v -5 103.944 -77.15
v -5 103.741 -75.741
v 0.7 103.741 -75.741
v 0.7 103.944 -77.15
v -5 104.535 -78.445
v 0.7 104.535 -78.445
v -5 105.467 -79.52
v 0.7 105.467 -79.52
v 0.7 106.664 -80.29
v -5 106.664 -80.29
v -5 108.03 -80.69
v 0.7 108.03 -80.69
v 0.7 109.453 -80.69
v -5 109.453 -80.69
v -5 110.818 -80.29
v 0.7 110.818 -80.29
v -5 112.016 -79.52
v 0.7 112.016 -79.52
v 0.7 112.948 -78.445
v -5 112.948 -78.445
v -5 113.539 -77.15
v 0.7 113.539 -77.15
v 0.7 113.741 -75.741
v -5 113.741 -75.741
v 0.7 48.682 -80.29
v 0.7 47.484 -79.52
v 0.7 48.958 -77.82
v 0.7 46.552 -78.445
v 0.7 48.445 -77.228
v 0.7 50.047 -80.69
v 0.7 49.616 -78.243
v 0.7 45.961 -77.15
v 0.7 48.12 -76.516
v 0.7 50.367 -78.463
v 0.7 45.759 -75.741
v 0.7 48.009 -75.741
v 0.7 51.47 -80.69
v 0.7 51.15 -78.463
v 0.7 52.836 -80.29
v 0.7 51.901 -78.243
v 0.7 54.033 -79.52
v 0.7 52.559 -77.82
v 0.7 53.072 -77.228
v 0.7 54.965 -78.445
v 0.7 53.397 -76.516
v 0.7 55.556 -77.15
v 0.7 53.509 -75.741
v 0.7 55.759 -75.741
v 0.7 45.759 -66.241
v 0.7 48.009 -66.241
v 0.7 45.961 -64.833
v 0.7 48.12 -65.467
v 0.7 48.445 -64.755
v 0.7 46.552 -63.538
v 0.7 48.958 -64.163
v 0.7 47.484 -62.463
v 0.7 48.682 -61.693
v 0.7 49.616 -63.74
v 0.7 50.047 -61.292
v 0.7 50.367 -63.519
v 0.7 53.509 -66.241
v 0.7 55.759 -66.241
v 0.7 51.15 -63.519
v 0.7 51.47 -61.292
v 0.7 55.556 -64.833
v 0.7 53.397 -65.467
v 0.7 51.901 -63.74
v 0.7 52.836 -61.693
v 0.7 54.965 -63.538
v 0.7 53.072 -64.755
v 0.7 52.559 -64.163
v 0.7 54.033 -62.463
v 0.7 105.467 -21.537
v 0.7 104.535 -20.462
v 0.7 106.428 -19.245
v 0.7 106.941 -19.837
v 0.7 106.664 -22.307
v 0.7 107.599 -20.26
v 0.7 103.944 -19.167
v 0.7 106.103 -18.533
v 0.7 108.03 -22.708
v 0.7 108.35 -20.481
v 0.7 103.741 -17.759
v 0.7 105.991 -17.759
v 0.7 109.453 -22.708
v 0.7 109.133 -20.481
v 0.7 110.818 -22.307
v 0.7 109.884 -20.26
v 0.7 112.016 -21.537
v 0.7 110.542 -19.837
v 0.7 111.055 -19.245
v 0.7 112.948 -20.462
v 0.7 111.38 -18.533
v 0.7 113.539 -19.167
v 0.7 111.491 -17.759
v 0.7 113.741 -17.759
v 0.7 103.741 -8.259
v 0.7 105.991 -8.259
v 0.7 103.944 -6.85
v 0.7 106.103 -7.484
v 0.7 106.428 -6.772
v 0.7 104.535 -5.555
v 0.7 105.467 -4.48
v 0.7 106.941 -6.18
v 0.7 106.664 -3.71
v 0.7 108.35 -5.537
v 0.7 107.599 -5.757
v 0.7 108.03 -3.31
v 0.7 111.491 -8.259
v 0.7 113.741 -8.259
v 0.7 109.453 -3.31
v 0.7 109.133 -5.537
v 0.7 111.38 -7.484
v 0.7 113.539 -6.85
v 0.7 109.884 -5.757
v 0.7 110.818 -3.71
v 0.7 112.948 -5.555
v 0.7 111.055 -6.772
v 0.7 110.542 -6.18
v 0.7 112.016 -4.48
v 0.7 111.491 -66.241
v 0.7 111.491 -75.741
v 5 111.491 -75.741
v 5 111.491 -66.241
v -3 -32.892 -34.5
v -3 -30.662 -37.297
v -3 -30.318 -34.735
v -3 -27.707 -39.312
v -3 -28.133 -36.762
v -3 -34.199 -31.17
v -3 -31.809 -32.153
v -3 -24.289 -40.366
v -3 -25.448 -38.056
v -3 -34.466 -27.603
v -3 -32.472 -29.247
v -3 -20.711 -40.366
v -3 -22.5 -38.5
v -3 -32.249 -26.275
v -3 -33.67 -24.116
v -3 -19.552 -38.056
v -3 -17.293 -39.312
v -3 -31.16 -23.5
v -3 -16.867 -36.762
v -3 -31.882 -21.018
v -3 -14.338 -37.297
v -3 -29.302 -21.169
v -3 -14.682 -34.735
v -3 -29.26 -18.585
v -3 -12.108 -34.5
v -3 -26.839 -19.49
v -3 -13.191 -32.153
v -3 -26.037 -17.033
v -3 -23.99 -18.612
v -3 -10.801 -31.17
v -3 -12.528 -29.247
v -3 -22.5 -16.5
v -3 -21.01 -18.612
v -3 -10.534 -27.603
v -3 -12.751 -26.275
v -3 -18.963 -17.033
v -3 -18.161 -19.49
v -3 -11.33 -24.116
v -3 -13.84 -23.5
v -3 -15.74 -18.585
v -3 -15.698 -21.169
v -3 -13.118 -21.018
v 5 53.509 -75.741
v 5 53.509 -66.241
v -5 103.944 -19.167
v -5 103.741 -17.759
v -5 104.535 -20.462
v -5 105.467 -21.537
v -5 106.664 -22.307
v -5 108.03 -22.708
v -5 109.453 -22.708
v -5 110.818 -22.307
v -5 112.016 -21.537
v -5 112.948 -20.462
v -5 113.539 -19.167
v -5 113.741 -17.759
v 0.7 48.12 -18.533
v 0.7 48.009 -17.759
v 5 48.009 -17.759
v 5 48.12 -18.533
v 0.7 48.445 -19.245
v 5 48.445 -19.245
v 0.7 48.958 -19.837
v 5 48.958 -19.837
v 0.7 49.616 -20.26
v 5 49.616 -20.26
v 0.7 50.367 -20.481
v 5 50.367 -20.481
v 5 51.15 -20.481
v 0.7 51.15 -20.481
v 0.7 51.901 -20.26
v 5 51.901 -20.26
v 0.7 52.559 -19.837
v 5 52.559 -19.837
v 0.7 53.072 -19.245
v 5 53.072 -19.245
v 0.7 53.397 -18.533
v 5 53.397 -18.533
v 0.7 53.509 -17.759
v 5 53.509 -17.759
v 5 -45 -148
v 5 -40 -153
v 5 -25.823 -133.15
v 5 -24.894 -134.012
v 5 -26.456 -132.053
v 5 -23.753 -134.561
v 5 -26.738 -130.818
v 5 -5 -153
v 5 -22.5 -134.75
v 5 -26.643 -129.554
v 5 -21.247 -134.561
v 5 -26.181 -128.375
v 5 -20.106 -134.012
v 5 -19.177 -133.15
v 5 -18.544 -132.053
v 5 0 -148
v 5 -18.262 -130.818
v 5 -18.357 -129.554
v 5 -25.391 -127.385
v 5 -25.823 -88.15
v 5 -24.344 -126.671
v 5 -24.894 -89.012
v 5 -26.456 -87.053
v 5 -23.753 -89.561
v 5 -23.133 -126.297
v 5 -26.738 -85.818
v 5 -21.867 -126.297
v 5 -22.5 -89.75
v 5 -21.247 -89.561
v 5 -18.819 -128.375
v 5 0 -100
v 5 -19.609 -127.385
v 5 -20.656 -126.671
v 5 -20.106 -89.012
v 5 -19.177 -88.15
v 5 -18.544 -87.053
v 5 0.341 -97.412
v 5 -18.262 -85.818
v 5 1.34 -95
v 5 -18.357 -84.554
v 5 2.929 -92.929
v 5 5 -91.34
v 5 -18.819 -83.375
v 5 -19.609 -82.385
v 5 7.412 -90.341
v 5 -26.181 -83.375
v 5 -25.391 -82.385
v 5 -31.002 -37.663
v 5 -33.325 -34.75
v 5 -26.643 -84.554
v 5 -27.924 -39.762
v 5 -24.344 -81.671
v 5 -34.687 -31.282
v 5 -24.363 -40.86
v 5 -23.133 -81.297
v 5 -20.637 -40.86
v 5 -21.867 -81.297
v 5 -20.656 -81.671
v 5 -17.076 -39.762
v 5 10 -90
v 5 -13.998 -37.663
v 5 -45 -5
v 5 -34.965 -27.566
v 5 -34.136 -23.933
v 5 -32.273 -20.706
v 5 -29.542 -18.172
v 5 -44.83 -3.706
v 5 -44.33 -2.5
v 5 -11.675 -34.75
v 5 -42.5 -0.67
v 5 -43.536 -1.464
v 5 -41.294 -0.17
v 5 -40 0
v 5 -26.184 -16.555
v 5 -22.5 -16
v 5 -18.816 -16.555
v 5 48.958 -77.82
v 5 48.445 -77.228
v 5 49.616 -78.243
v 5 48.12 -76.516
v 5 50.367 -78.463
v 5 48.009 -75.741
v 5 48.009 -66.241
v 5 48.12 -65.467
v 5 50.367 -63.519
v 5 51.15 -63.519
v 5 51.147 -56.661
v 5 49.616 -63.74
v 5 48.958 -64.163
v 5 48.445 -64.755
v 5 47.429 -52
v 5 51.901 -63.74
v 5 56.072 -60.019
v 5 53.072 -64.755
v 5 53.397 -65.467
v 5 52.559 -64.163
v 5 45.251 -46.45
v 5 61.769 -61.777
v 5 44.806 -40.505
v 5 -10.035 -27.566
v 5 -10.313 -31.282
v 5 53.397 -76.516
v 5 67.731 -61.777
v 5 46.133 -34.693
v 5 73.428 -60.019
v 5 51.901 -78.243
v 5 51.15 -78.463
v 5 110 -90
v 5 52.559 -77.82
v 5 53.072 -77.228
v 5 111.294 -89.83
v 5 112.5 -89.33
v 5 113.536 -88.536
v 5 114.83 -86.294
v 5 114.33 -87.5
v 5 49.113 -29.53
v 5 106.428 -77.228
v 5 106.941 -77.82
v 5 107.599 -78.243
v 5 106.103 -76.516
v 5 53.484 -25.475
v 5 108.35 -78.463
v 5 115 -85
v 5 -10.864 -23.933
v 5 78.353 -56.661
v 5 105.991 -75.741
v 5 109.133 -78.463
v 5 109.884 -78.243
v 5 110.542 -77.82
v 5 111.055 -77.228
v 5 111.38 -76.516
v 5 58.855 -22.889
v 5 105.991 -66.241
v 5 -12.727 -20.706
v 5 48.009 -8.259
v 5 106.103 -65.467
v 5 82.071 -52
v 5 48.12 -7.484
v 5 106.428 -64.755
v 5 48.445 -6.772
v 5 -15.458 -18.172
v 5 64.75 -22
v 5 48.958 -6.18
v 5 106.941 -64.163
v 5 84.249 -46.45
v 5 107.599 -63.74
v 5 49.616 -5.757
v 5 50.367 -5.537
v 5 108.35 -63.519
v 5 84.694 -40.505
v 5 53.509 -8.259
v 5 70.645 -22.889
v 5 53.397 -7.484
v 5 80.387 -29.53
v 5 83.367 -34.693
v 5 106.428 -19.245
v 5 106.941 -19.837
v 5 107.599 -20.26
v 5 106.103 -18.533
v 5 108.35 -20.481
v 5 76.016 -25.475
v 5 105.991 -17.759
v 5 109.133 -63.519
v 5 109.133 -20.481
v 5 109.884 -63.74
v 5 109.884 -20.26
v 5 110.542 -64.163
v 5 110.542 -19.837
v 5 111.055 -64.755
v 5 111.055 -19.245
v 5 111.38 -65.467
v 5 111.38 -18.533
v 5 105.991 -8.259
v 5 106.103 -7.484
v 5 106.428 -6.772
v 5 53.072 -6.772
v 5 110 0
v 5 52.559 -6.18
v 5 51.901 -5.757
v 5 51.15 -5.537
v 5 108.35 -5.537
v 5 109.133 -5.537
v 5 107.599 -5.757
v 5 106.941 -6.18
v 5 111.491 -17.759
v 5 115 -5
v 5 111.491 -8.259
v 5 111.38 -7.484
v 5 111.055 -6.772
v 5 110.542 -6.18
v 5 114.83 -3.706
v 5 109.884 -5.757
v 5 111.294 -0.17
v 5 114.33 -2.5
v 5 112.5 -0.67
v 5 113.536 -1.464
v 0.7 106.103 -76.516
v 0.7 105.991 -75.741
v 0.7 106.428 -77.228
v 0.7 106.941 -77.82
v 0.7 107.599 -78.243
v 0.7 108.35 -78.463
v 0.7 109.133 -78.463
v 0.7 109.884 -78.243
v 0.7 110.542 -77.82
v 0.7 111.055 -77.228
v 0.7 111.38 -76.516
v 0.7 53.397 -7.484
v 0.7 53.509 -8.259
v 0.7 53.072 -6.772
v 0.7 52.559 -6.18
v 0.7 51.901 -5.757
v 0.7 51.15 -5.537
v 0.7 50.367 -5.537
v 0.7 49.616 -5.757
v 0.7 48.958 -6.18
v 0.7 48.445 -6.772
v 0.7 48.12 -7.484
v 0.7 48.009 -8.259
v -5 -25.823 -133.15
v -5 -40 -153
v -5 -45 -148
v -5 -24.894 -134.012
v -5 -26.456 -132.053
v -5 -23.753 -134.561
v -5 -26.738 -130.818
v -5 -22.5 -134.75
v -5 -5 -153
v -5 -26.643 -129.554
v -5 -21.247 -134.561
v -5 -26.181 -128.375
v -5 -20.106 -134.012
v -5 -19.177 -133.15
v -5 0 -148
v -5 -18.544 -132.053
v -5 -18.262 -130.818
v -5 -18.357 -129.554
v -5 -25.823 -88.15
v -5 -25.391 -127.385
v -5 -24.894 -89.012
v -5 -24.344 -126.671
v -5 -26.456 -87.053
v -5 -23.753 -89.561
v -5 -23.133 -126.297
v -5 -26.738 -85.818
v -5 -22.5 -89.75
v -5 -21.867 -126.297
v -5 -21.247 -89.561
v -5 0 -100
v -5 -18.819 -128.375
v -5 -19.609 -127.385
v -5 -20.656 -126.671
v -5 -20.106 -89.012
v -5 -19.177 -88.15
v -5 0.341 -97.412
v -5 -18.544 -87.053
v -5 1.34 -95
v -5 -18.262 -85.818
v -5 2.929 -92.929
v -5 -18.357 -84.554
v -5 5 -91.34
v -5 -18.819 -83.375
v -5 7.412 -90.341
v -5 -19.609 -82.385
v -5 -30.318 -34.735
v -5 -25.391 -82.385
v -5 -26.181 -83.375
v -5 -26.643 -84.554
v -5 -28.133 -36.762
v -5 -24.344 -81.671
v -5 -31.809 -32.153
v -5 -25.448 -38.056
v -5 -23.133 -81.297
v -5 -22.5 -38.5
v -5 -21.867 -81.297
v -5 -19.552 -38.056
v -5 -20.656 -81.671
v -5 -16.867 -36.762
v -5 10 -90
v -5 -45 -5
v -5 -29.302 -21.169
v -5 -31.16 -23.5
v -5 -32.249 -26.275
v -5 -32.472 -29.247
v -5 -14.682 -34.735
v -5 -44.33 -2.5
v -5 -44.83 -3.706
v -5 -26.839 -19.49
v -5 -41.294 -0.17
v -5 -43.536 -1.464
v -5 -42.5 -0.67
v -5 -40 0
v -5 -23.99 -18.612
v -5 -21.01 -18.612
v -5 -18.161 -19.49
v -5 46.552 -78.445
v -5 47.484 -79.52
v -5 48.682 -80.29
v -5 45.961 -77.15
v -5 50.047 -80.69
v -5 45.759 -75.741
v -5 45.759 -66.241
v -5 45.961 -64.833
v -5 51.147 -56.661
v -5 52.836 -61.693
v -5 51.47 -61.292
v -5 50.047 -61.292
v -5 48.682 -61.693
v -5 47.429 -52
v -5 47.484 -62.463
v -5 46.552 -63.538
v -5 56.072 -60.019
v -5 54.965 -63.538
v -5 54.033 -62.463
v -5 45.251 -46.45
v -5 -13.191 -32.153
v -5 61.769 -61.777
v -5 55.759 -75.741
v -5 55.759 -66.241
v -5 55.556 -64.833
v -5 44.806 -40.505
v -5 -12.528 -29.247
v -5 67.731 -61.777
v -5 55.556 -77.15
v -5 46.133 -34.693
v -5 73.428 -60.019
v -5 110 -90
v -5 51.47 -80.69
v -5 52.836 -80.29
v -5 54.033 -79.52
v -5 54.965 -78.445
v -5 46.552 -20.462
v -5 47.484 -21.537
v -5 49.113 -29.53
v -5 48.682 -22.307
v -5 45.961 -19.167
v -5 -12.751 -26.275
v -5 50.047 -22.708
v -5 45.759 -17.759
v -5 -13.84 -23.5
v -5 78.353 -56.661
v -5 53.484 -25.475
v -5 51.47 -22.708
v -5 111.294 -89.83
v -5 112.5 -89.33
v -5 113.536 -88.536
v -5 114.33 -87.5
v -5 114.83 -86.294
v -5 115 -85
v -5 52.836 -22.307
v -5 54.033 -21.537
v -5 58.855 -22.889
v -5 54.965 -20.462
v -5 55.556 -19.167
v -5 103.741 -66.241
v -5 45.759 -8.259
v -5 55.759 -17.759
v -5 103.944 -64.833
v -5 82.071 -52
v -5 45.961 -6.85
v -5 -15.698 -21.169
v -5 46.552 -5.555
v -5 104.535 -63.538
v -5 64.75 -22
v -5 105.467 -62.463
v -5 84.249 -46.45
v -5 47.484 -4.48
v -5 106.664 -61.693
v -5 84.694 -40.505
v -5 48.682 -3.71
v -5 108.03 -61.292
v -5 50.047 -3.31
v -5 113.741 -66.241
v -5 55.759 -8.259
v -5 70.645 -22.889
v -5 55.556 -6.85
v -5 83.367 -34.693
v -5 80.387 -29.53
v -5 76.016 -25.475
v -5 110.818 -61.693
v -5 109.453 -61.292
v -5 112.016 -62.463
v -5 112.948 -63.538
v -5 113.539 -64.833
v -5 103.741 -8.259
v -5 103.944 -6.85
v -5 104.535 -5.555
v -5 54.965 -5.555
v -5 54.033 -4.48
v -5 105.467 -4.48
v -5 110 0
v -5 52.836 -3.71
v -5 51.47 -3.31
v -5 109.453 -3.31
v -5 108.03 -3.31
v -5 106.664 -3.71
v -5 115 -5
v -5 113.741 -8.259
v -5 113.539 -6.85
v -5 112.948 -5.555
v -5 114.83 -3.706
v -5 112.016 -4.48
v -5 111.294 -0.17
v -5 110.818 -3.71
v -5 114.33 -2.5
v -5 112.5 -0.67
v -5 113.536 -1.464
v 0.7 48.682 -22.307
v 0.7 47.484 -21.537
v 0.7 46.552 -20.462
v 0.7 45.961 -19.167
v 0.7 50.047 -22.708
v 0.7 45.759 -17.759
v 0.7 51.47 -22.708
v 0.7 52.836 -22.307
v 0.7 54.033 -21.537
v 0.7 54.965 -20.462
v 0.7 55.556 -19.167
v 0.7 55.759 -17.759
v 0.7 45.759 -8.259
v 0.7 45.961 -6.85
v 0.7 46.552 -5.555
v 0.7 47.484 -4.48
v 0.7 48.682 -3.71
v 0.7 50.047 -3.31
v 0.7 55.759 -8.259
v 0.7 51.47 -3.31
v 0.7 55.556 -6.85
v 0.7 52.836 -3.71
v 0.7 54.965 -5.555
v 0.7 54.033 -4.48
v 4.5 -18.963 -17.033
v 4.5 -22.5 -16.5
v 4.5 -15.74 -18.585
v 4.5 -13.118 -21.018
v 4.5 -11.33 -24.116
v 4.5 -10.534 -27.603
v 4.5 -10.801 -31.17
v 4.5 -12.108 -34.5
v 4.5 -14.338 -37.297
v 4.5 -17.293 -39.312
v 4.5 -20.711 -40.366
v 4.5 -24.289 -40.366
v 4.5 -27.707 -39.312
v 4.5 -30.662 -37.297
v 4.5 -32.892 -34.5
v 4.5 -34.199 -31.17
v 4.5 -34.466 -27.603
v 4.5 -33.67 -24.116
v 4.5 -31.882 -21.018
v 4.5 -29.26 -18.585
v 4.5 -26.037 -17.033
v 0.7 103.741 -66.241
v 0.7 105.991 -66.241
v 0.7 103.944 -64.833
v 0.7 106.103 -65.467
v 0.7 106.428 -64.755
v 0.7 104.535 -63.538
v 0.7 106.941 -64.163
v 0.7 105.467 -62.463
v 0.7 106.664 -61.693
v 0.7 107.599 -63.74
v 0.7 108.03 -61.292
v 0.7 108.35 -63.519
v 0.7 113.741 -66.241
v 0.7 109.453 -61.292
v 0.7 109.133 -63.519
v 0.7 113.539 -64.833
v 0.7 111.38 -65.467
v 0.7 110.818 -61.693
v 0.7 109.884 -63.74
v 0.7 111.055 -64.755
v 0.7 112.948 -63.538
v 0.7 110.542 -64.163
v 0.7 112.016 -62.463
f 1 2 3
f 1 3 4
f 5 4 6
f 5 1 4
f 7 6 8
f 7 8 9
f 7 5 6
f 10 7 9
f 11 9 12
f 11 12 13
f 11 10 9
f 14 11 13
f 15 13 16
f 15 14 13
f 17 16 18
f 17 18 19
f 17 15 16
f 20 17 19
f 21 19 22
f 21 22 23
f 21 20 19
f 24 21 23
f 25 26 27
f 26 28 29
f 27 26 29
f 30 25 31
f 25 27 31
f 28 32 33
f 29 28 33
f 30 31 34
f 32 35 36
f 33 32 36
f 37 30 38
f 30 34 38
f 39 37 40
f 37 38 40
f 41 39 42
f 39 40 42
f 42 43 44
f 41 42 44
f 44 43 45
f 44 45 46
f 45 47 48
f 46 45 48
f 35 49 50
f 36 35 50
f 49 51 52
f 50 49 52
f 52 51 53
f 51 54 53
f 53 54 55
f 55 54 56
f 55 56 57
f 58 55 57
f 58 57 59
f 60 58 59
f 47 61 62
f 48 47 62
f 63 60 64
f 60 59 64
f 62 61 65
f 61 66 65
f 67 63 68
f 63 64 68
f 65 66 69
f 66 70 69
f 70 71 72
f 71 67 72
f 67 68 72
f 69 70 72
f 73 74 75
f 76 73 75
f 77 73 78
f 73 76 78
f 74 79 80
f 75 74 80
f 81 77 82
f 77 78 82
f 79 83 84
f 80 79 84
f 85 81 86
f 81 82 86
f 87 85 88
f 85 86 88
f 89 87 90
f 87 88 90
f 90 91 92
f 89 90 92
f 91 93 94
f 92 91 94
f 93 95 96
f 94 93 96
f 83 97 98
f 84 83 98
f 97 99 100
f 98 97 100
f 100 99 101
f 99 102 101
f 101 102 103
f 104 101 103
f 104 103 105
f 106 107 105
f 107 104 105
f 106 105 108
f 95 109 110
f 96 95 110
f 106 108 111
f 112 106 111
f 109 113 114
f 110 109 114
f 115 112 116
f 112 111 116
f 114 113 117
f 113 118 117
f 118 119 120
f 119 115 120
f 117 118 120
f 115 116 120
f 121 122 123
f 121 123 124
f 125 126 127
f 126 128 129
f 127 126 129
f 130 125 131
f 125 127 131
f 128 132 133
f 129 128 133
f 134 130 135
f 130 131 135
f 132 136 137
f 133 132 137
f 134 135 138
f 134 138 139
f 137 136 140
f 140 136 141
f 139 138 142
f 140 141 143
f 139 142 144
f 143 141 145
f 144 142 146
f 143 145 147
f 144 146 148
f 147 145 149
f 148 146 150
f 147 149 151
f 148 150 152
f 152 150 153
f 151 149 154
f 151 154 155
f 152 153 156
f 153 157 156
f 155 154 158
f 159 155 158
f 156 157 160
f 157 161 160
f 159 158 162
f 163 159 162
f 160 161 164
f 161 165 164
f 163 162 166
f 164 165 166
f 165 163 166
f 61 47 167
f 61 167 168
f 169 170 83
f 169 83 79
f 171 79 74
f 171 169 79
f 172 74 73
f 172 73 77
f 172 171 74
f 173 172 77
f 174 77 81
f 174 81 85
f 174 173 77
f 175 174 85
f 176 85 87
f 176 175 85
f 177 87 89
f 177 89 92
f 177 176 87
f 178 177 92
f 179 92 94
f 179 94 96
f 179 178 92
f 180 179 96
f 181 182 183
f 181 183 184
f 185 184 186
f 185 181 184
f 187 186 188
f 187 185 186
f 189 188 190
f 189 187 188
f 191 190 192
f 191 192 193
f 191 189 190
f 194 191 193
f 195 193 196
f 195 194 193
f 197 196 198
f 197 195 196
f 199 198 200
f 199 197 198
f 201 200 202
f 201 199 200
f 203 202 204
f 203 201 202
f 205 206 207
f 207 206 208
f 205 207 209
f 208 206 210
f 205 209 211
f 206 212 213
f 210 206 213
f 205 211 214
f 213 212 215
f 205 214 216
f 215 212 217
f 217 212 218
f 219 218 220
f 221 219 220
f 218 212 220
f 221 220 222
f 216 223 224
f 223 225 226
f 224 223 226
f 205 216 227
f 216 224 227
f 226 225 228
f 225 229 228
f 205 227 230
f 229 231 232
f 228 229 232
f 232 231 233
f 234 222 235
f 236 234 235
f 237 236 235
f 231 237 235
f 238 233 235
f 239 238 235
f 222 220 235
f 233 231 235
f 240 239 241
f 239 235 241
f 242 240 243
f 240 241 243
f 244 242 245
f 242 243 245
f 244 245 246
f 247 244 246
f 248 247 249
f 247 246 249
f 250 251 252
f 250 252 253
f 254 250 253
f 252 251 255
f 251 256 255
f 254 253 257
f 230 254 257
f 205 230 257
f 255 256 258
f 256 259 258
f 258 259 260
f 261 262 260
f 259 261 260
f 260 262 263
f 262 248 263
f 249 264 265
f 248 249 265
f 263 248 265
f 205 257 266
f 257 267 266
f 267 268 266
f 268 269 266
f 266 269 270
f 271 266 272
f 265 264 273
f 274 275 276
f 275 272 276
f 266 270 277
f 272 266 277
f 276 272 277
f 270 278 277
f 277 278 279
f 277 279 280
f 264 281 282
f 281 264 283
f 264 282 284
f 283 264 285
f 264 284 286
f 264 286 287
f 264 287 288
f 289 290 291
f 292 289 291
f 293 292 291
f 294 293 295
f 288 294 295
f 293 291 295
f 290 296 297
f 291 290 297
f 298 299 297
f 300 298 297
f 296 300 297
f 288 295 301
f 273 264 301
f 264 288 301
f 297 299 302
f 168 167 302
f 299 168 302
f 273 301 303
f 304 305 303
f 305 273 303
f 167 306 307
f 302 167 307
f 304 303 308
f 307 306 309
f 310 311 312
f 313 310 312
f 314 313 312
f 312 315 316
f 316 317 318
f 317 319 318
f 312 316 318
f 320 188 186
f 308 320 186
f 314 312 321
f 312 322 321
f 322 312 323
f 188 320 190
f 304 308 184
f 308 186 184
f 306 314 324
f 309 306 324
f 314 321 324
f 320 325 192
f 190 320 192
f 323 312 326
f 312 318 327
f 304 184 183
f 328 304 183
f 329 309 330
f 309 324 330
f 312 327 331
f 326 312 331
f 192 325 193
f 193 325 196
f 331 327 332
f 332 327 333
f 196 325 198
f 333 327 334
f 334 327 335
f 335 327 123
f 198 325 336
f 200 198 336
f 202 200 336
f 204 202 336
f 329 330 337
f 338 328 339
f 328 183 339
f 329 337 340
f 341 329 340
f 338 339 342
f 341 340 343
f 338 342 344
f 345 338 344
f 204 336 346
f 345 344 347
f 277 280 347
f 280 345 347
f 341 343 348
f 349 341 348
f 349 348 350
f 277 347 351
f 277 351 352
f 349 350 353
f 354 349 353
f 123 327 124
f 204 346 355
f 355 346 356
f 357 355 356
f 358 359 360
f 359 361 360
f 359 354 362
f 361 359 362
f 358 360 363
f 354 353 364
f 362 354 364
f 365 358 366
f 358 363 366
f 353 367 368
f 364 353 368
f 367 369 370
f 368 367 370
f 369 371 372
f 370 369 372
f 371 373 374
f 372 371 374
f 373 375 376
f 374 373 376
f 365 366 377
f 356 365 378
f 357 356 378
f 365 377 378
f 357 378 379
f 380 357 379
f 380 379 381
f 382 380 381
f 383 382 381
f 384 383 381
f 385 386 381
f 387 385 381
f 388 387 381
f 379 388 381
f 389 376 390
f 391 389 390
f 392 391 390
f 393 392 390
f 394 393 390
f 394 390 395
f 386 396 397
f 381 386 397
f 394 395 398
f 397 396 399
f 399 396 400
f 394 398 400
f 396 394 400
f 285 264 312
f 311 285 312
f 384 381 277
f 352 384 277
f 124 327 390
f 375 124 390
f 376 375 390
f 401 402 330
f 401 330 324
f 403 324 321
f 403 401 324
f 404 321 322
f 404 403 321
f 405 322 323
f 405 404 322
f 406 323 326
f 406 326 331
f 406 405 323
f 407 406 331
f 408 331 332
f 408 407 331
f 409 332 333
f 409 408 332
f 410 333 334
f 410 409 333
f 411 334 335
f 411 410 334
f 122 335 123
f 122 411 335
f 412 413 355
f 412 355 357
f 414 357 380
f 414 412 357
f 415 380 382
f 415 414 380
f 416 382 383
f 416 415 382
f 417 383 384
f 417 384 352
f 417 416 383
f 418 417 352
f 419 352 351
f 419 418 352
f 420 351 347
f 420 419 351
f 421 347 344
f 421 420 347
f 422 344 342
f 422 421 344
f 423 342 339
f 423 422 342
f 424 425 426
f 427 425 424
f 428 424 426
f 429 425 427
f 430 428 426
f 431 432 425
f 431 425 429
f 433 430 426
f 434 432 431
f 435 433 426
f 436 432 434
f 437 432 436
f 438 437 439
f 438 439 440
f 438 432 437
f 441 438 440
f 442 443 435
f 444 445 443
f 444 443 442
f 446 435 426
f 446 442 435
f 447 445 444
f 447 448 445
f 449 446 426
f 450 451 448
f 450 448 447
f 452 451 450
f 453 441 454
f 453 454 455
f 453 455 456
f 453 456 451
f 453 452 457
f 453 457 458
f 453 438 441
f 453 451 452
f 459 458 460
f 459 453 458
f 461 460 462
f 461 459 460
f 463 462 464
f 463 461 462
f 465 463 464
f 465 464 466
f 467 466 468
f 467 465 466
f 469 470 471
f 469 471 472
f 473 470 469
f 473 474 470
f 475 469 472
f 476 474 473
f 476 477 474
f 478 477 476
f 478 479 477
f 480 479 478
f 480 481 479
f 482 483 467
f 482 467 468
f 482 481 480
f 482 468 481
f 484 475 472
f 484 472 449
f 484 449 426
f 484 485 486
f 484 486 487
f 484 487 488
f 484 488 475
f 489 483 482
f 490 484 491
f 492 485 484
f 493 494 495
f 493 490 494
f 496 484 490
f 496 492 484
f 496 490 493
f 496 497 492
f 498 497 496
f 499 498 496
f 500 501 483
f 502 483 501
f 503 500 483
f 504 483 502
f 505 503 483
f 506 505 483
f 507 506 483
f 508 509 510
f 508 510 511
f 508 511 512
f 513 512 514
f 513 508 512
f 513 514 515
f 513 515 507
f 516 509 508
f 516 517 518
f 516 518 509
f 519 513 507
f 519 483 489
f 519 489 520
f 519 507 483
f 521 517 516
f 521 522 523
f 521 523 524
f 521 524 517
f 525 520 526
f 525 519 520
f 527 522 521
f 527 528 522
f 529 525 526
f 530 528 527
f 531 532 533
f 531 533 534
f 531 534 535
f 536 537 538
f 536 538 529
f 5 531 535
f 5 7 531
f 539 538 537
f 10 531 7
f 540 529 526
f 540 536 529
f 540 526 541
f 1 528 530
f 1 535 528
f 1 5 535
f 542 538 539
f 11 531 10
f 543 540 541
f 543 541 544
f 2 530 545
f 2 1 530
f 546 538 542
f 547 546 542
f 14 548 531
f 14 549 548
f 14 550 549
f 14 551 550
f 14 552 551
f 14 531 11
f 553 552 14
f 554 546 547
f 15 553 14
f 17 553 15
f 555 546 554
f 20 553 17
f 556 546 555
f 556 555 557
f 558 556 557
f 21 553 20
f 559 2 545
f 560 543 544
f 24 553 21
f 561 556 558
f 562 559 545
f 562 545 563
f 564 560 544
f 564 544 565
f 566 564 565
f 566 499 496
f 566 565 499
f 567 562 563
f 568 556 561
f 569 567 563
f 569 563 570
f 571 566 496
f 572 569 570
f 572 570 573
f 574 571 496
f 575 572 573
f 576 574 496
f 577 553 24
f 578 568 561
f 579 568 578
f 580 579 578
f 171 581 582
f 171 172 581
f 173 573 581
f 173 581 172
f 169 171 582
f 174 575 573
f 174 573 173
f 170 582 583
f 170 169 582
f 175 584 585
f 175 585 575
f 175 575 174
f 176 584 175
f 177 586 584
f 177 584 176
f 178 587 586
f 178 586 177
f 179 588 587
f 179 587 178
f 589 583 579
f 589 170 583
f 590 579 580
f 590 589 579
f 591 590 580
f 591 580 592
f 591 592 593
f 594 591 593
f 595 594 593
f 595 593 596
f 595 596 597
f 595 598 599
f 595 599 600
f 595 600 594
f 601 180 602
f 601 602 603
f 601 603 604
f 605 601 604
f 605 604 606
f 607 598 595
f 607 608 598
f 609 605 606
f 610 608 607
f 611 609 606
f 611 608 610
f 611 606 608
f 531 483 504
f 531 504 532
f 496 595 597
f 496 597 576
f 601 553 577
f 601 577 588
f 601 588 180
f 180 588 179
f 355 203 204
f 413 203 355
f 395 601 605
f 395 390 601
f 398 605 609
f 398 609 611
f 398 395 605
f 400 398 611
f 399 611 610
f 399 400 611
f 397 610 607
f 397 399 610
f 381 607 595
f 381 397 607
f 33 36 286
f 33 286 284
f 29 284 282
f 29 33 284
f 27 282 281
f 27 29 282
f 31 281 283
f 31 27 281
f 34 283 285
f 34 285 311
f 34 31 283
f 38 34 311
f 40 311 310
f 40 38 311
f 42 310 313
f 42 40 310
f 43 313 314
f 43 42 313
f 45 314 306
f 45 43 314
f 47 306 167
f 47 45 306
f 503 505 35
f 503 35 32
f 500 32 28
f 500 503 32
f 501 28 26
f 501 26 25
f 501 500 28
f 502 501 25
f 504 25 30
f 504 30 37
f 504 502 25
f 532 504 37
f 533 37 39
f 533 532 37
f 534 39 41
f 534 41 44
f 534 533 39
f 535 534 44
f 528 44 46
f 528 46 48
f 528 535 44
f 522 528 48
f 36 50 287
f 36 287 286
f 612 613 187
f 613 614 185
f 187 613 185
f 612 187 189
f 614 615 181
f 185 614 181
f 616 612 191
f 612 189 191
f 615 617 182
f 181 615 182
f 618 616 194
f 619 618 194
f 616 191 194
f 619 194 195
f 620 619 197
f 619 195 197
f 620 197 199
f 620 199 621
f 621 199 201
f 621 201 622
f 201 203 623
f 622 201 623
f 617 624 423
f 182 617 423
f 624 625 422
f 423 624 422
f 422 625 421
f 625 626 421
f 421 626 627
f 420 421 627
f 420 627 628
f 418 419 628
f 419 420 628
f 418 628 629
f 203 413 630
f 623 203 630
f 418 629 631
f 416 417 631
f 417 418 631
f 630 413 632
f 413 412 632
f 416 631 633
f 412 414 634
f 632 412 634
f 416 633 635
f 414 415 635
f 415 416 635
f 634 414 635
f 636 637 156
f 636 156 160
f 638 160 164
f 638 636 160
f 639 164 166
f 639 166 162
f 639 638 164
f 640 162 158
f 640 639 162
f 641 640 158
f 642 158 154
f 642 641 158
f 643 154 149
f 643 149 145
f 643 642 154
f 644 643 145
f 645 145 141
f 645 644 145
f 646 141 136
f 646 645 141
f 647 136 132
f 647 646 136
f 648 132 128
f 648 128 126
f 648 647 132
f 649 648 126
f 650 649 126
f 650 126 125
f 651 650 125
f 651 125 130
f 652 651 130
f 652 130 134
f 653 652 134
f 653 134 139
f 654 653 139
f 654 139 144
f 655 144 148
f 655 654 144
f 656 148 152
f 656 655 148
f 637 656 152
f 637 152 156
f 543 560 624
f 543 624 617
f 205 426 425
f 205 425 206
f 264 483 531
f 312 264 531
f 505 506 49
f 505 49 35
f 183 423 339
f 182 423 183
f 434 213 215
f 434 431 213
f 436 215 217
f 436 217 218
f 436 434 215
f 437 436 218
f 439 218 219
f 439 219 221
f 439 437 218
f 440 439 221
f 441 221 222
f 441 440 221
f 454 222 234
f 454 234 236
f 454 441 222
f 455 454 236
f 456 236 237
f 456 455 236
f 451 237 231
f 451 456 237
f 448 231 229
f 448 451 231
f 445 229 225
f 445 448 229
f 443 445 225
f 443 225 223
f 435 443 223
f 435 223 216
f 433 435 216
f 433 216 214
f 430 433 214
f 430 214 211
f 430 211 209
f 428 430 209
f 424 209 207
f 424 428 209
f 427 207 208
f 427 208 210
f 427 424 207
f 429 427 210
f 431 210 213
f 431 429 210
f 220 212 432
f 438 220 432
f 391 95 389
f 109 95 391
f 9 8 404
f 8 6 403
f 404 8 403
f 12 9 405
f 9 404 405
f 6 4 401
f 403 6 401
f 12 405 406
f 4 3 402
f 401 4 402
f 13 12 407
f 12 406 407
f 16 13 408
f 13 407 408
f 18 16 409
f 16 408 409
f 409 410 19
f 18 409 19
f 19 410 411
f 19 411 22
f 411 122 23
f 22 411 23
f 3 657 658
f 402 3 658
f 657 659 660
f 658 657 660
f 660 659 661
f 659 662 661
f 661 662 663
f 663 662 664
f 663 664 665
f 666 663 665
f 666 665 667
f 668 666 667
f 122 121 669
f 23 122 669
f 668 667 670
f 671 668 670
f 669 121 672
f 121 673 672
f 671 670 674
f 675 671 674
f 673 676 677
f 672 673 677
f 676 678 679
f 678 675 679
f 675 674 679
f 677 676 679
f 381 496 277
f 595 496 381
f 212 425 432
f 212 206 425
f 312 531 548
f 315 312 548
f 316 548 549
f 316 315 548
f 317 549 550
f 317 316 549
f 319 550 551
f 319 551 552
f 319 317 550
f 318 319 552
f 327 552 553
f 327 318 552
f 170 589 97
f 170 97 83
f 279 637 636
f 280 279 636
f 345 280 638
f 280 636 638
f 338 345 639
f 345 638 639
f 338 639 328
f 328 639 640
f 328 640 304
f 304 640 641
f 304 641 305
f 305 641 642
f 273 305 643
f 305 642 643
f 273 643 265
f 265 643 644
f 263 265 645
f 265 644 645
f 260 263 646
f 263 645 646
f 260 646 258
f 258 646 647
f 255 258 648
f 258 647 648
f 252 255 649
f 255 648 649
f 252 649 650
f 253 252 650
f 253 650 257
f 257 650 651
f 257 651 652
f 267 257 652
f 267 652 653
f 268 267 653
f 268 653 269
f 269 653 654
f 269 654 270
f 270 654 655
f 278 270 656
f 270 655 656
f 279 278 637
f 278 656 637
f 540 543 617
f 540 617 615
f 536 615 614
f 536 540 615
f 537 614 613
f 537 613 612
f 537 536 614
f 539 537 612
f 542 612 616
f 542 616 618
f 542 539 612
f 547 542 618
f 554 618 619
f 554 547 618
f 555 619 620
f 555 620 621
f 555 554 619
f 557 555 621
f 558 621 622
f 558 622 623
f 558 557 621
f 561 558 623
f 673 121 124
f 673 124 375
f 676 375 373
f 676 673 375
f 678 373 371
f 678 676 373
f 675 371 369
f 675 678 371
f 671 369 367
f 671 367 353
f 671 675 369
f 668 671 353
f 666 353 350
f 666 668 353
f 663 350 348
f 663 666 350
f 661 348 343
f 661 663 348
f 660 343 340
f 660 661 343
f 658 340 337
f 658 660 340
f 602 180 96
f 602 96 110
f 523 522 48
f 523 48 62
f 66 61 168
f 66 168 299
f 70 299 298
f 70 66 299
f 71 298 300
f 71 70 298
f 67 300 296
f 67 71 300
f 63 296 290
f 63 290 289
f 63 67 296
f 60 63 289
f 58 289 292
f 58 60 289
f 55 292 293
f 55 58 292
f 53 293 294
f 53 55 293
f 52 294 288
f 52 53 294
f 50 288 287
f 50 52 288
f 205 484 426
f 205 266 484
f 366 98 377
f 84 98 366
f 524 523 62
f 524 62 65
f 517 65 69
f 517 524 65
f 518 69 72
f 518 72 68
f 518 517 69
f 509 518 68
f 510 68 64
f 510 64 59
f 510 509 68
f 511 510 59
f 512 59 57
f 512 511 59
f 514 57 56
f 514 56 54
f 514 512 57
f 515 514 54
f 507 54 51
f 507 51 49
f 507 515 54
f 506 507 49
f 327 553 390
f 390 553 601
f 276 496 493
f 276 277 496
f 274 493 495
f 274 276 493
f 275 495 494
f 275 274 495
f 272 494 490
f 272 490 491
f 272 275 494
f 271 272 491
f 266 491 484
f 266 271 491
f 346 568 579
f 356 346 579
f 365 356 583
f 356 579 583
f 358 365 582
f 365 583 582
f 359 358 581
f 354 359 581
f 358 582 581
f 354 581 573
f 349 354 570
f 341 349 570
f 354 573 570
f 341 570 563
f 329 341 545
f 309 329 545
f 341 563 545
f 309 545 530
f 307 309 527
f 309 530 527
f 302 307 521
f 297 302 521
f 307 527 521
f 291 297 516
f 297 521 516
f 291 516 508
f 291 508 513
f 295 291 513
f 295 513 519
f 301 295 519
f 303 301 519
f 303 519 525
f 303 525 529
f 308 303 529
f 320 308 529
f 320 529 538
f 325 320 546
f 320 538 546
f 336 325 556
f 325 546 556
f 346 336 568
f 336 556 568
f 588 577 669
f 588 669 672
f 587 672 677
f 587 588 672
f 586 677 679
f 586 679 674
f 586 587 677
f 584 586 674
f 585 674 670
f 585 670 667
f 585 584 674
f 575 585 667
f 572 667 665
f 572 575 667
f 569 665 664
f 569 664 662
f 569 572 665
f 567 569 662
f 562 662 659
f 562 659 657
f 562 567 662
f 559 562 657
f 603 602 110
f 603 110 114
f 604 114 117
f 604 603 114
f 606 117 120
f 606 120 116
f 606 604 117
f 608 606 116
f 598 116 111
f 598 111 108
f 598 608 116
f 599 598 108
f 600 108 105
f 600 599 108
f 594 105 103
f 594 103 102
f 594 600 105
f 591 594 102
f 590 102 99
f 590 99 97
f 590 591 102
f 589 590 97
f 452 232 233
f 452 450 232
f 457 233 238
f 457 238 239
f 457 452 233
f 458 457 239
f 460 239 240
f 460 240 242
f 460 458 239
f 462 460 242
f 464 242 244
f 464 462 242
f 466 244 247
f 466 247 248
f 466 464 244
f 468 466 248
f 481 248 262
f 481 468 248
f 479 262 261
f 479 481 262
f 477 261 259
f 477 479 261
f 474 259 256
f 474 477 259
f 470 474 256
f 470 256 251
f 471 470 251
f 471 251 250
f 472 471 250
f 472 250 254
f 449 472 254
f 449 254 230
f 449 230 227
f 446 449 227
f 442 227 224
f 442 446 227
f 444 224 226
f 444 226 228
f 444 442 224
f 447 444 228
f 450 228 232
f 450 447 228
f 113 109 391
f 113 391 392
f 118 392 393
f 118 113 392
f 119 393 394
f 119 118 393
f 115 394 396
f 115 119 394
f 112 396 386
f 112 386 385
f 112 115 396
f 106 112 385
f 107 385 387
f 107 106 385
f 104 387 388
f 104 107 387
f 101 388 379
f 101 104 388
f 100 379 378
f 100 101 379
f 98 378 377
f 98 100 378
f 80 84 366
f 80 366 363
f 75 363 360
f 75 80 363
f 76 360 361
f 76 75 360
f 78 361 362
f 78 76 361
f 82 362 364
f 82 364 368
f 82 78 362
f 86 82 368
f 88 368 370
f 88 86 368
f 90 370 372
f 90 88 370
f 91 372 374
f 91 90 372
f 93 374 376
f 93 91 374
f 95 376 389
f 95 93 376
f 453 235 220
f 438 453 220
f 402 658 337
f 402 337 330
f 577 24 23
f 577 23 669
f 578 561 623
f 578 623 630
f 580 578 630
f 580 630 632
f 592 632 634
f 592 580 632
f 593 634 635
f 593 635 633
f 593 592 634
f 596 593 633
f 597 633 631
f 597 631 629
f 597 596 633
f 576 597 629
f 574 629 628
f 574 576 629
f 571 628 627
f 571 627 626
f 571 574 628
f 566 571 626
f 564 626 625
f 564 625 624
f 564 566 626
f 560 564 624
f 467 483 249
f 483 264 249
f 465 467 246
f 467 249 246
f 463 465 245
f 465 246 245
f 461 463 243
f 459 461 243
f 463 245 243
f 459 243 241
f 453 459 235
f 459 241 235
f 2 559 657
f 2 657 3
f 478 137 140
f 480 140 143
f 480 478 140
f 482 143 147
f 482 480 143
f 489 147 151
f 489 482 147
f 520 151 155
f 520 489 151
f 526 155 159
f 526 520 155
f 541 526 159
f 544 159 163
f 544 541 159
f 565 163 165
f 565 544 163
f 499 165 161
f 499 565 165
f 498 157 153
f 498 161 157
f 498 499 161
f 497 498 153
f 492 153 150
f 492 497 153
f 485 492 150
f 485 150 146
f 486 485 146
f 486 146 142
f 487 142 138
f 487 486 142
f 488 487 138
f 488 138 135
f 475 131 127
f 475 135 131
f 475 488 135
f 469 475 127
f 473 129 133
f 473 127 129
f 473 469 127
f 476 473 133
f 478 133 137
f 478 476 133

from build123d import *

# Parameters (mm, degrees)
SKETCH_1_W             = 153
SKETCH_1_H             = 45
SKETCH_1_R             = 10
SKETCH_1_R_2           = 4.25
EXTRUDE_1_DEPTH        = 5
SKETCH_6_R             = 12
CUT_EXTRUDE_1077_DEPTH = 8
SKETCH_9_W             = 90
SKETCH_9_H             = 115
EXTRUDE_2_DEPTH        = 10
HOLE_START             = -5
HOLE_WIZARD_2_DEPTH    = 5.7
HOLE_START_2           = 0.7
HOLE_WIZARD_2_2_DEPTH  = 4.3
CHAMFER_1_SIZE         = 5
FILLET_1_R             = 5
CHAMFER_2_SIZE         = 0.5
FILLET_2_R             = 10
SKETCH_13_R            = 20
CUT_EXTRUDE_1_DEPTH    = 10


# Read off the part's stored shape, not the designer's step: 打孔尺寸(%根据)内六角圆柱头螺钉的类型2
with BuildPart() as part:
    # 草图1 → 凸台-拉伸1 (new, symmetric)
    with BuildSketch(Plane(origin=(0, 0, 0), x_dir=(0, 0, -1), z_dir=(1, 0, 0))):
        with Locations((76.5, -22.5)):
            Rectangle(SKETCH_1_W, SKETCH_1_H)
        with Locations((28.5, -22.5)):
            Circle(SKETCH_1_R, mode=Mode.SUBTRACT)
        with Locations((85.5, -22.5)):
            Circle(SKETCH_1_R_2, mode=Mode.SUBTRACT)
        with Locations((130.5, -22.5)):
            Circle(SKETCH_1_R_2, mode=Mode.SUBTRACT)
    extrude(amount=EXTRUDE_1_DEPTH, both=True)

    # 草图6 → Cut-Extrude 1077 (cut)
    with BuildSketch(Plane.ZY.offset(-5)):
        with Locations((-28.5, -22.5)):
            Circle(SKETCH_6_R)
    extrude(amount=CUT_EXTRUDE_1077_DEPTH, mode=Mode.SUBTRACT)

    # 草图9 → 凸台-拉伸2 (add)
    with BuildSketch(Plane.ZY.offset(5)):
        with Locations((-45, 57.5)):
            Rectangle(SKETCH_9_W, SKETCH_9_H)
    extrude(amount=-EXTRUDE_2_DEPTH)

    # 打孔尺寸(%根据)内六角圆柱头螺钉的类型2 outline → 打孔尺寸(%根据)内六角圆柱头螺钉的类型2 (cut)
    with BuildSketch(Plane.YZ.offset(HOLE_START)):
        with BuildLine():
            ThreePointArc((55.758621971, -66.241378029), (50.758621971, -61.241378029), (45.758621971, -66.241378029))
            Line((45.758621971, -66.241378029), (45.758621971, -75.741378029))
            ThreePointArc((45.758621971, -75.741378029), (50.758621971, -80.741378029), (55.758621971, -75.741378029))
            Line((55.758621971, -75.741378029), (55.758621971, -66.241378029))
        make_face()
        with BuildLine():
            Line((55.758621971, -17.758621971), (55.758621971, -8.258621971))
            ThreePointArc((55.758621971, -8.258621971), (50.758621971, -3.258621971), (45.758621971, -8.258621971))
            Line((45.758621971, -8.258621971), (45.758621971, -17.758621971))
            ThreePointArc((45.758621971, -17.758621971), (50.758621971, -22.758621971), (55.758621971, -17.758621971))
        make_face()
        with BuildLine():
            ThreePointArc((113.741378029, -8.258621971), (108.741378029, -3.258621971), (103.741378029, -8.258621971))
            Line((103.741378029, -8.258621971), (103.741378029, -17.758621971))
            ThreePointArc((103.741378029, -17.758621971), (108.741378029, -22.758621971), (113.741378029, -17.758621971))
            Line((113.741378029, -17.758621971), (113.741378029, -8.258621971))
        make_face()
        with BuildLine():
            Line((113.741378029, -75.741378029), (113.741378029, -66.241378029))
            ThreePointArc((113.741378029, -66.241378029), (108.741378029, -61.241378029), (103.741378029, -66.241378029))
            Line((103.741378029, -66.241378029), (103.741378029, -75.741378029))
            ThreePointArc((103.741378029, -75.741378029), (108.741378029, -80.741378029), (113.741378029, -75.741378029))
        make_face()
    extrude(amount=HOLE_WIZARD_2_DEPTH, mode=Mode.SUBTRACT)

    # Hole Wizard 2 2 outline → Hole Wizard 2 2 (cut)
    with BuildSketch(Plane.YZ.offset(HOLE_START_2)):
        with BuildLine():
            ThreePointArc((53.508621971, -66.241378029), (50.758621971, -63.491378029), (48.008621971, -66.241378029))
            Line((48.008621971, -66.241378029), (48.008621971, -75.741378029))
            ThreePointArc((48.008621971, -75.741378029), (50.758621971, -78.491378029), (53.508621971, -75.741378029))
            Line((53.508621971, -75.741378029), (53.508621971, -66.241378029))
        make_face()
        with BuildLine():
            Line((53.508621971, -17.758621971), (53.508621971, -8.258621971))
            ThreePointArc((53.508621971, -8.258621971), (50.758621971, -5.508621971), (48.008621971, -8.258621971))
            Line((48.008621971, -8.258621971), (48.008621971, -17.758621971))
            ThreePointArc((48.008621971, -17.758621971), (50.758621971, -20.508621971), (53.508621971, -17.758621971))
        make_face()
        with BuildLine():
            ThreePointArc((111.491378029, -8.258621971), (108.741378029, -5.508621971), (105.991378029, -8.258621971))
            Line((105.991378029, -8.258621971), (105.991378029, -17.758621971))
            ThreePointArc((105.991378029, -17.758621971), (108.741378029, -20.508621971), (111.491378029, -17.758621971))
            Line((111.491378029, -17.758621971), (111.491378029, -8.258621971))
        make_face()
        with BuildLine():
            Line((111.491378029, -75.741378029), (111.491378029, -66.241378029))
            ThreePointArc((111.491378029, -66.241378029), (108.741378029, -63.491378029), (105.991378029, -66.241378029))
            Line((105.991378029, -66.241378029), (105.991378029, -75.741378029))
            ThreePointArc((105.991378029, -75.741378029), (108.741378029, -78.491378029), (111.491378029, -75.741378029))
        make_face()
    extrude(amount=HOLE_WIZARD_2_2_DEPTH, mode=Mode.SUBTRACT)

    # 倒角1
    chamfer_1_edges = [part.edges().sort_by_distance(p)[0] for p in [
        (0, -45, -153),
        (0, 0, -153),
    ]]
    chamfer(chamfer_1_edges, length=CHAMFER_1_SIZE)

    # 圆角1
    fillet_1_edges = [part.edges().sort_by_distance(p)[0] for p in [
        (0, -45, 0),
        (0, 115, -90),
        (0, 115, 0),
    ]]
    fillet(fillet_1_edges, radius=FILLET_1_R)

    # 倒角2
    chamfer_2_edges = [part.edges().sort_by_distance(p)[0] for p in [
        (5, -22.5, -40.5),
    ]]
    chamfer(chamfer_2_edges, length=CHAMFER_2_SIZE)

    # 圆角2
    fillet_2_edges = [part.edges().sort_by_distance(p)[0] for p in [
        (0, 0, -90),
    ]]
    fillet(fillet_2_edges, radius=FILLET_2_R)

    # 草图13 → 切除-拉伸1 (cut)
    with BuildSketch(Plane.ZY.offset(5)):
        with Locations((-42, 64.75)):
            Circle(SKETCH_13_R)
    extrude(amount=-CUT_EXTRUDE_1_DEPTH, mode=Mode.SUBTRACT)


solid = part.part
